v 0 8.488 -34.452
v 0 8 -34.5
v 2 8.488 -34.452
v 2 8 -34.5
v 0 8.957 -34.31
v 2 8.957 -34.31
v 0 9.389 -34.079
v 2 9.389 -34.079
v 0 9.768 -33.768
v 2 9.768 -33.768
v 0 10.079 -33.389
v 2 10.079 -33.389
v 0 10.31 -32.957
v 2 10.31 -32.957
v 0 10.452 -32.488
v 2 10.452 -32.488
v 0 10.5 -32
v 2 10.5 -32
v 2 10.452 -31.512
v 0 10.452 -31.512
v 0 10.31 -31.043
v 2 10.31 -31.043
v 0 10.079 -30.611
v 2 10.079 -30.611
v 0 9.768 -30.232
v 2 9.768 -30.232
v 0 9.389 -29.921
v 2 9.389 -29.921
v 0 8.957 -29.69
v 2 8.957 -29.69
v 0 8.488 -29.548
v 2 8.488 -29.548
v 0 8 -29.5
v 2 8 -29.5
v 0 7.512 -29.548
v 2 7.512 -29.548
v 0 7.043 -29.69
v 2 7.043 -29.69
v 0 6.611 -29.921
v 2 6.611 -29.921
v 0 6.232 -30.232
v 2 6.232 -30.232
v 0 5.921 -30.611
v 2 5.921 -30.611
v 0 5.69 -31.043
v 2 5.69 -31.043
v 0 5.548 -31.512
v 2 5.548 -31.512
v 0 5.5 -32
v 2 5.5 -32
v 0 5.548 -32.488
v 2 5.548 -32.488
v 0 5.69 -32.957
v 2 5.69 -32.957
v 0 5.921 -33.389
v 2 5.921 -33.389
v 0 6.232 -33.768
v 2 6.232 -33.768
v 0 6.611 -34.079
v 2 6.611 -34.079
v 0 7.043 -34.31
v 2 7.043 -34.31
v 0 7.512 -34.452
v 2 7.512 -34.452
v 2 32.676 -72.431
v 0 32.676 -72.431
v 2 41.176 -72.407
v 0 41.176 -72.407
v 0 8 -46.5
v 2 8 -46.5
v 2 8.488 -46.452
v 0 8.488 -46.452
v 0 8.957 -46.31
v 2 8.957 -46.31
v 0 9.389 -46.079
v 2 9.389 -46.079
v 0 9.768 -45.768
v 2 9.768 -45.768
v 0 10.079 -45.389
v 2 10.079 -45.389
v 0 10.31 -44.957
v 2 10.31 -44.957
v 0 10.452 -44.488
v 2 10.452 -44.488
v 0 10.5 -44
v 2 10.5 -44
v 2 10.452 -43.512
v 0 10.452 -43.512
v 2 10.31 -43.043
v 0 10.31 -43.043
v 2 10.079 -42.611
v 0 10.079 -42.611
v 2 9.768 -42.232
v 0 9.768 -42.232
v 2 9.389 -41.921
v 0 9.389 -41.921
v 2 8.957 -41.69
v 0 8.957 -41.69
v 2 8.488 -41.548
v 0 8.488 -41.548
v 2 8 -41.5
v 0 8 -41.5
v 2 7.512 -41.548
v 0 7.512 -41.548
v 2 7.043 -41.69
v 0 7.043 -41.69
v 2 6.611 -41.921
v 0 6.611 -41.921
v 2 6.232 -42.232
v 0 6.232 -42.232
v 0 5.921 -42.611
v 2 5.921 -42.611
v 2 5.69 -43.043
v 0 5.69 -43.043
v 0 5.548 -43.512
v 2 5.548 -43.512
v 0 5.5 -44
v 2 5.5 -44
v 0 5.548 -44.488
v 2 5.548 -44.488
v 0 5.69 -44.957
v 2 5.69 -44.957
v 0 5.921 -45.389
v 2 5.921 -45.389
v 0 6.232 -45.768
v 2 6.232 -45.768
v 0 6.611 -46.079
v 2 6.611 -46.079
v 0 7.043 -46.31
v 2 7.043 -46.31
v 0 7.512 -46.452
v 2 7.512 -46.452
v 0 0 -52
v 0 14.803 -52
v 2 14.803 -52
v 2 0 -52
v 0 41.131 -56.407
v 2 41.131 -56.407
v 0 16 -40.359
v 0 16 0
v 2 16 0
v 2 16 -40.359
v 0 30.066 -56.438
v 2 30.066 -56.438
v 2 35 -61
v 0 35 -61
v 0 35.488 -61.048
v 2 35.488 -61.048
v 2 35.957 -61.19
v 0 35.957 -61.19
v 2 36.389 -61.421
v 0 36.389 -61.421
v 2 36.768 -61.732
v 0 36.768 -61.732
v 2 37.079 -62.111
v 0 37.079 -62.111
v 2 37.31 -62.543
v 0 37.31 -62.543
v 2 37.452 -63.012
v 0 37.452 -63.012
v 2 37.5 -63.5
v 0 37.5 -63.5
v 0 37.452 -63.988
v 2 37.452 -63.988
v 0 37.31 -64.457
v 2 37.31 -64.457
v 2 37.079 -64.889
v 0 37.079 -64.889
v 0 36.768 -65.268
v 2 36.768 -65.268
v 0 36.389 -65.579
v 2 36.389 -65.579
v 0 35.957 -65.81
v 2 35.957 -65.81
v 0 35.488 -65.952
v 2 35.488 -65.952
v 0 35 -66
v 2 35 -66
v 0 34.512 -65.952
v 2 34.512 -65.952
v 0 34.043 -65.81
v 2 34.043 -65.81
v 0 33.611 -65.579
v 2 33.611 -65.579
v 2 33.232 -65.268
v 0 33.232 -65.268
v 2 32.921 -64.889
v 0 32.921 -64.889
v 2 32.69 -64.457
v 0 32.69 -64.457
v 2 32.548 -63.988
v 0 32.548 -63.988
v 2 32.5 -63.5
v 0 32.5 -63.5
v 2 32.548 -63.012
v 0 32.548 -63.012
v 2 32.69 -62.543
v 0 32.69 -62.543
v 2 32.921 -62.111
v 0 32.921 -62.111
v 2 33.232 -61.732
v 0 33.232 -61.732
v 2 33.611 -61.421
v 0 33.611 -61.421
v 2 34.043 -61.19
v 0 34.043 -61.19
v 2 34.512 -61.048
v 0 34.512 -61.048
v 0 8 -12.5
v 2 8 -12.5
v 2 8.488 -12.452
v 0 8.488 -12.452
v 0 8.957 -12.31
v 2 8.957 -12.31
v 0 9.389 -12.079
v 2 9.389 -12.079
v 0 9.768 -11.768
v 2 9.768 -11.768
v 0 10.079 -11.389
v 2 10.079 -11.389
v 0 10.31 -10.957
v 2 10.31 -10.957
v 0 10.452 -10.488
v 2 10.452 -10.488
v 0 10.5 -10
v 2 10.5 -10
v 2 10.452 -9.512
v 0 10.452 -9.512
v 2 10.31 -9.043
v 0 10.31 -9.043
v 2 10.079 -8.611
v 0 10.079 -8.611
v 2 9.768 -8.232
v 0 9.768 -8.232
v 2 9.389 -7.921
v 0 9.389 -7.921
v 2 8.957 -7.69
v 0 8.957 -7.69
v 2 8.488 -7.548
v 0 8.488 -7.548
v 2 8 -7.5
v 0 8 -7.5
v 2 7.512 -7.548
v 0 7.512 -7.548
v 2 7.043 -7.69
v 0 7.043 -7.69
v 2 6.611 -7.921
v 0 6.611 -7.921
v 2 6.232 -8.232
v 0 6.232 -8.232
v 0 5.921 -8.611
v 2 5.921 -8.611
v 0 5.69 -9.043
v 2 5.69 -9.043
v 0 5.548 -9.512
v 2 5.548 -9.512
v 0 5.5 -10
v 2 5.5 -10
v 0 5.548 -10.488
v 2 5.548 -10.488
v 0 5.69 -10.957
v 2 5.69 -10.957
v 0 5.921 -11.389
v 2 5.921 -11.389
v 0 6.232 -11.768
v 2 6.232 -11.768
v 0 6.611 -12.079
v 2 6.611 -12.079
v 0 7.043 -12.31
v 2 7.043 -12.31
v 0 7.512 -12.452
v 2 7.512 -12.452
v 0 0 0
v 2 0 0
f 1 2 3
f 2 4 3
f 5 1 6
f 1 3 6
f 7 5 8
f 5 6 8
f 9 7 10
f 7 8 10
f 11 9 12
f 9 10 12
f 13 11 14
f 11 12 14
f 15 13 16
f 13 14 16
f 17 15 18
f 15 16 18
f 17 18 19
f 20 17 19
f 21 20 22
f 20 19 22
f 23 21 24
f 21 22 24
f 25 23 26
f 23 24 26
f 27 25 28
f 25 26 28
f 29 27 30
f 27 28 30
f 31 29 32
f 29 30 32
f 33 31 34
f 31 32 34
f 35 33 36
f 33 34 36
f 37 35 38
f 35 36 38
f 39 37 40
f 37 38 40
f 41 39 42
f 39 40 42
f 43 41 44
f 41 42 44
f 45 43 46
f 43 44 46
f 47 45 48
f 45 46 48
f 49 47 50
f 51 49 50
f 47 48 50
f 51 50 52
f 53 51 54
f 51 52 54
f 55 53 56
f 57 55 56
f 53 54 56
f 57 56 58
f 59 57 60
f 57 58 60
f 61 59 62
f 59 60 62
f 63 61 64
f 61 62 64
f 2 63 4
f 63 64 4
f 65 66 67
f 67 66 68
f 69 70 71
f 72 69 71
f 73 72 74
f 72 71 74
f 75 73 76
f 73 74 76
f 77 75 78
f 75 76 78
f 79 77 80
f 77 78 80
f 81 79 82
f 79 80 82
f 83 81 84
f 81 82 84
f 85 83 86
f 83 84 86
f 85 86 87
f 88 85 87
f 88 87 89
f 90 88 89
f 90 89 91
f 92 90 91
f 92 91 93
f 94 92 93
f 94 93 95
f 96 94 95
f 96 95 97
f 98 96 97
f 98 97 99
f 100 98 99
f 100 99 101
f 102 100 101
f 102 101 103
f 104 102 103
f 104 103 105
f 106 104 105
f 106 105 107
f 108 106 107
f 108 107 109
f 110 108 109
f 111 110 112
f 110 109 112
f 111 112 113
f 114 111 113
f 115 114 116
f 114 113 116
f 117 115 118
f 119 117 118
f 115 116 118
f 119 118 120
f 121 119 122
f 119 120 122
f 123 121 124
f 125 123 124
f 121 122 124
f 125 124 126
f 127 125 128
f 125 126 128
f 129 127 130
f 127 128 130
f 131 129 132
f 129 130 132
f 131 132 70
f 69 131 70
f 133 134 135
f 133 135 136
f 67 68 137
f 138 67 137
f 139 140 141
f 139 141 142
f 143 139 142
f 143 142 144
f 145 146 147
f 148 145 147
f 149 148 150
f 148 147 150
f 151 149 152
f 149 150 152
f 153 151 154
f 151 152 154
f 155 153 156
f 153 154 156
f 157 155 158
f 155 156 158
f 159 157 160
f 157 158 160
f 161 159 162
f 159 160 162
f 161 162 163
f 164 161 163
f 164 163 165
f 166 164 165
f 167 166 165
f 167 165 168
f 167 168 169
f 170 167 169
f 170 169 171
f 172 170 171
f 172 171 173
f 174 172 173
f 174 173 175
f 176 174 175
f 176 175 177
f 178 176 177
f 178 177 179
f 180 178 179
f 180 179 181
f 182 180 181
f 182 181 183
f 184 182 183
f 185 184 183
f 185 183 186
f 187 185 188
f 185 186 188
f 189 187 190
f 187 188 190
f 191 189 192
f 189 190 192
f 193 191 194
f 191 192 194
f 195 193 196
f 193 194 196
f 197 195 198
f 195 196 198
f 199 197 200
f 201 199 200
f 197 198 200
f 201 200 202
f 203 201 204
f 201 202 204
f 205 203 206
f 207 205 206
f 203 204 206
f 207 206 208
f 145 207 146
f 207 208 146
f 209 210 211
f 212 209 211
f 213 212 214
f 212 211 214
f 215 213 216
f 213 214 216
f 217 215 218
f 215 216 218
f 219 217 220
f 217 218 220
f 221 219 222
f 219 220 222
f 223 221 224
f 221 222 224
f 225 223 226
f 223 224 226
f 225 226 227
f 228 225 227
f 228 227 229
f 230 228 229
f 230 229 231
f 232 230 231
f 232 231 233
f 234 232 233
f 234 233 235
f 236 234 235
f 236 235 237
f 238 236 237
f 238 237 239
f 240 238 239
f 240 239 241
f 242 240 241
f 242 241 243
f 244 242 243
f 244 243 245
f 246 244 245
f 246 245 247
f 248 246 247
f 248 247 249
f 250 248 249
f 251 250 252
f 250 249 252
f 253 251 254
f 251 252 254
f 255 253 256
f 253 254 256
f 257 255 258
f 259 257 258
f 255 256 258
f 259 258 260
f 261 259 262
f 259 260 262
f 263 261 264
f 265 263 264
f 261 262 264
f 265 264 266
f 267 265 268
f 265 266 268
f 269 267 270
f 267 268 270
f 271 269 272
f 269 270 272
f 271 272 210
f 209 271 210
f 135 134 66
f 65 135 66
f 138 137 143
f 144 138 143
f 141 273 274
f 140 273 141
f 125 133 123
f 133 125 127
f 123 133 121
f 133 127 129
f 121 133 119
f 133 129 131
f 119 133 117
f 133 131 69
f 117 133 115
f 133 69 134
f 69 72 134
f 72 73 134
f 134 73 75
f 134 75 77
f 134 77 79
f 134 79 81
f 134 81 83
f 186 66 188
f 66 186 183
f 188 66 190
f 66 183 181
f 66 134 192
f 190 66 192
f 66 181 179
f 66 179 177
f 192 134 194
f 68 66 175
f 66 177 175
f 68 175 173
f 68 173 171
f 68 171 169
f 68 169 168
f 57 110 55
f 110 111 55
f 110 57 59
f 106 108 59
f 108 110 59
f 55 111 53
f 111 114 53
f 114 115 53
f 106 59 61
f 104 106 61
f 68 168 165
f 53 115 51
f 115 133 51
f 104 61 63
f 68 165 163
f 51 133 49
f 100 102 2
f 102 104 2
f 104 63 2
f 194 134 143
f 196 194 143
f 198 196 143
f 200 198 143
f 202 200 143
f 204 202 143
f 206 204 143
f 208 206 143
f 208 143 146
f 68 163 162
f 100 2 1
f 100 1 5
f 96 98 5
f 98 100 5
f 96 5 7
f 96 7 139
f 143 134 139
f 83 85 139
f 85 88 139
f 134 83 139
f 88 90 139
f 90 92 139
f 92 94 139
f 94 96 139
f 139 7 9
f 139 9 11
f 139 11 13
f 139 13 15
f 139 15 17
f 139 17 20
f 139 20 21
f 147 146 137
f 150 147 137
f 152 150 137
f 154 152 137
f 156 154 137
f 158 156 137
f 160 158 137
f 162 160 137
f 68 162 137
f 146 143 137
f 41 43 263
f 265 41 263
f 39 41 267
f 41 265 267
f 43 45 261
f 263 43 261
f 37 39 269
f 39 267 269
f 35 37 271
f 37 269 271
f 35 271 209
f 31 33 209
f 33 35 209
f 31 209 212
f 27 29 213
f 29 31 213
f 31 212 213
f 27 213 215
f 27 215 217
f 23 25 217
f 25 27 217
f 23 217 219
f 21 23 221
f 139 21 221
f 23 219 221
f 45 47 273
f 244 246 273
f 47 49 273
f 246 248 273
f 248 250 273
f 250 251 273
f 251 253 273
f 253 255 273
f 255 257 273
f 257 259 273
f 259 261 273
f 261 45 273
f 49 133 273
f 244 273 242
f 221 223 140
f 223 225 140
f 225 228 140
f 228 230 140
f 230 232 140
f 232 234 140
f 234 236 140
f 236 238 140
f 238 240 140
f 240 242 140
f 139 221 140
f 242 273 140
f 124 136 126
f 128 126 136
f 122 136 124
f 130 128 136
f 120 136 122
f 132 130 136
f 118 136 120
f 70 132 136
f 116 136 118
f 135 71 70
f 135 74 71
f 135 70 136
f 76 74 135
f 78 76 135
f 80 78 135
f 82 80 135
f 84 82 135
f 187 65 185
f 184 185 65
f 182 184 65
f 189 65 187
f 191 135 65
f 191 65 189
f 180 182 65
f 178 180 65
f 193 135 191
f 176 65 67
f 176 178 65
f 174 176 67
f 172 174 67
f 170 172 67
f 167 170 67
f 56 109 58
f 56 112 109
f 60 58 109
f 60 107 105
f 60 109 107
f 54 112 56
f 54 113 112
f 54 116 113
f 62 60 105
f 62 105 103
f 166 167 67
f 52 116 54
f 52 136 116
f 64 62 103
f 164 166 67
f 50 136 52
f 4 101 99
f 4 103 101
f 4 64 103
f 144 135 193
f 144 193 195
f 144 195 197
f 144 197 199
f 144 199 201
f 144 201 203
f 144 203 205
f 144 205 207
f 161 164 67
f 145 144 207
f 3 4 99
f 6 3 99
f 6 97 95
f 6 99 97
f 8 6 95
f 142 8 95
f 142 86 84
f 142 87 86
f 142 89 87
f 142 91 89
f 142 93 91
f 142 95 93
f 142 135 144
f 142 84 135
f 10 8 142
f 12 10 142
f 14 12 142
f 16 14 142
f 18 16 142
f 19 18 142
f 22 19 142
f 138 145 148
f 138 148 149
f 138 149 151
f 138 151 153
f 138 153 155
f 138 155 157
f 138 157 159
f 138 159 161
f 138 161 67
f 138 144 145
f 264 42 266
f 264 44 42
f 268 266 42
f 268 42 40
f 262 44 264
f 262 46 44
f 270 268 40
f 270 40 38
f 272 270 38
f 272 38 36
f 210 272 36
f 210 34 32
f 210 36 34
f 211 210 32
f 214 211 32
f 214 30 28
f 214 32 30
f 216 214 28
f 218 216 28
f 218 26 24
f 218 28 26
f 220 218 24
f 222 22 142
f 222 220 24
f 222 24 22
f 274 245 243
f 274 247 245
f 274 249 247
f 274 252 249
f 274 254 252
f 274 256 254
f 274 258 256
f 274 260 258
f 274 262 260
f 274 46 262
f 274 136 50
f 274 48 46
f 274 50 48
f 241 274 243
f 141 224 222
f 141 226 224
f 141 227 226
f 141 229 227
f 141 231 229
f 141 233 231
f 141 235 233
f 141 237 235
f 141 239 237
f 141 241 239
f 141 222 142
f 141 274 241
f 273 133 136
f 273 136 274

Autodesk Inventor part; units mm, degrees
ref_plane "YZ Plane" through (0, 0, 0) normal (1, 0, 0) x (0, 1, 0)
ref_plane "XZ Plane" through (0, 0, 0) normal (0, 1, 0) x (-1, 0, 0)
ref_plane "XY Plane" through (0, 0, 0) normal (0, 0, 1) x (1, 0, 0)
sketch "Sketch1" plane through (0, 0, 0) normal (1, 0, 0) x (0, 1, 0)
  line L0 (0, 0) -> (16, 0)
  line L1 (16, 0) -> (16, -52)
  line L2 (16, -52) -> (0, -52)
  line L3 (0, -10) -> (0, -10)
  line L4 (0, -10) -> (0, -25)
  line L5 (0, -25) -> (0, -25)
  line L6 (0, -42) -> (0, -42)
  line L7 (0, -42) -> (0, -27)
  line L8 (0, -27) -> (0, -27)
  line L9 (0, -10) -> (0, 0)
  line L10 (0, -52) -> (0, -42)
  line L11 (0, -27) -> (0, -25)
  dimension "d0" = 16
  dimension "d1" = 52
  dimension "d2" = 0
  dimension "d3" = 15
  dimension "d4" = 10
  dimension "d5" = 15
  dimension "d6" = 10
  dimension "d10" = 0
  dimension "d11" = 0
  dimension "d12" = 0
extrude "Extrusion1" add sketch "Sketch1" along normal blind 2
sketch "Sketch3" plane through (2, 0, 0) normal (1, 0, 0) x (0, 0, -1)
  circle A0 centre (10, 8) radius 2.5
  circle A1 centre (32, 8) radius 2.5
  circle A2 centre (44, 8) radius 2.5
  line L0 (0, 16) -> (0, 0) projected
  line L1 (52, 16) -> (0, 16) projected
  dimension "d18" = 5
  dimension "d19" = 5
  dimension "d20" = 5
  dimension "d21" = 10
  dimension "d22" = 8
  dimension "d23" = 8
  dimension "d24" = 22
  dimension "d25" = 8
  dimension "d26" = 12
extrude "Extrusion3" cut sketch "Sketch3" against normal blind 10
sketch "Sketch4" plane through (0, 0, 0) normal (-1, 0, 0) x (0, 0, 1)
  circle A0 centre (-63.5, 35) radius 2.5 projected
  circle A1 centre (-77, 8) radius 1.5 projected
  circle A2 centre (-65, 8) radius 1.5 projected
  line L0 (-58, -1) -> (-58, 17) projected
  line L1 (-84, 17) -> (-58, 17) projected
  line L2 (-84, 17) -> (-84, -1) projected
  line L3 (-58, -1) -> (-84, -1) projected
  line L4 (-51.8335, 14.6577) -> (-40.3589, 16)
  line L5 (-52, 16) -> (0, 16) projected
  line L6 (-72.4772, 16.1758) -> (-72.4069, 41.1757) projected
  line L7 (-72.4069, 41.1757) -> (-56.407, 41.1307) projected
  line L8 (-56.407, 41.1307) -> (-56.4773, 16.1308) projected
  line L9 (-51.8335, 14.6577) -> (-72.4308, 32.6757)
  line L10 (-72.4069, 41.1757) -> (-56.407, 41.1307)
  line L11 (-56.407, 41.1307) -> (-56.4381, 30.0657)
  line L12 (-40.3589, 16) -> (-56.4381, 30.0657)
  point P0 (0, 0)
extrude "Extrusion4" add sketch "Sketch4" against normal blind 2 contours L6 L7 L8 L9 | L8 L12 L4 L9
properties part number "Mounting_wall"
